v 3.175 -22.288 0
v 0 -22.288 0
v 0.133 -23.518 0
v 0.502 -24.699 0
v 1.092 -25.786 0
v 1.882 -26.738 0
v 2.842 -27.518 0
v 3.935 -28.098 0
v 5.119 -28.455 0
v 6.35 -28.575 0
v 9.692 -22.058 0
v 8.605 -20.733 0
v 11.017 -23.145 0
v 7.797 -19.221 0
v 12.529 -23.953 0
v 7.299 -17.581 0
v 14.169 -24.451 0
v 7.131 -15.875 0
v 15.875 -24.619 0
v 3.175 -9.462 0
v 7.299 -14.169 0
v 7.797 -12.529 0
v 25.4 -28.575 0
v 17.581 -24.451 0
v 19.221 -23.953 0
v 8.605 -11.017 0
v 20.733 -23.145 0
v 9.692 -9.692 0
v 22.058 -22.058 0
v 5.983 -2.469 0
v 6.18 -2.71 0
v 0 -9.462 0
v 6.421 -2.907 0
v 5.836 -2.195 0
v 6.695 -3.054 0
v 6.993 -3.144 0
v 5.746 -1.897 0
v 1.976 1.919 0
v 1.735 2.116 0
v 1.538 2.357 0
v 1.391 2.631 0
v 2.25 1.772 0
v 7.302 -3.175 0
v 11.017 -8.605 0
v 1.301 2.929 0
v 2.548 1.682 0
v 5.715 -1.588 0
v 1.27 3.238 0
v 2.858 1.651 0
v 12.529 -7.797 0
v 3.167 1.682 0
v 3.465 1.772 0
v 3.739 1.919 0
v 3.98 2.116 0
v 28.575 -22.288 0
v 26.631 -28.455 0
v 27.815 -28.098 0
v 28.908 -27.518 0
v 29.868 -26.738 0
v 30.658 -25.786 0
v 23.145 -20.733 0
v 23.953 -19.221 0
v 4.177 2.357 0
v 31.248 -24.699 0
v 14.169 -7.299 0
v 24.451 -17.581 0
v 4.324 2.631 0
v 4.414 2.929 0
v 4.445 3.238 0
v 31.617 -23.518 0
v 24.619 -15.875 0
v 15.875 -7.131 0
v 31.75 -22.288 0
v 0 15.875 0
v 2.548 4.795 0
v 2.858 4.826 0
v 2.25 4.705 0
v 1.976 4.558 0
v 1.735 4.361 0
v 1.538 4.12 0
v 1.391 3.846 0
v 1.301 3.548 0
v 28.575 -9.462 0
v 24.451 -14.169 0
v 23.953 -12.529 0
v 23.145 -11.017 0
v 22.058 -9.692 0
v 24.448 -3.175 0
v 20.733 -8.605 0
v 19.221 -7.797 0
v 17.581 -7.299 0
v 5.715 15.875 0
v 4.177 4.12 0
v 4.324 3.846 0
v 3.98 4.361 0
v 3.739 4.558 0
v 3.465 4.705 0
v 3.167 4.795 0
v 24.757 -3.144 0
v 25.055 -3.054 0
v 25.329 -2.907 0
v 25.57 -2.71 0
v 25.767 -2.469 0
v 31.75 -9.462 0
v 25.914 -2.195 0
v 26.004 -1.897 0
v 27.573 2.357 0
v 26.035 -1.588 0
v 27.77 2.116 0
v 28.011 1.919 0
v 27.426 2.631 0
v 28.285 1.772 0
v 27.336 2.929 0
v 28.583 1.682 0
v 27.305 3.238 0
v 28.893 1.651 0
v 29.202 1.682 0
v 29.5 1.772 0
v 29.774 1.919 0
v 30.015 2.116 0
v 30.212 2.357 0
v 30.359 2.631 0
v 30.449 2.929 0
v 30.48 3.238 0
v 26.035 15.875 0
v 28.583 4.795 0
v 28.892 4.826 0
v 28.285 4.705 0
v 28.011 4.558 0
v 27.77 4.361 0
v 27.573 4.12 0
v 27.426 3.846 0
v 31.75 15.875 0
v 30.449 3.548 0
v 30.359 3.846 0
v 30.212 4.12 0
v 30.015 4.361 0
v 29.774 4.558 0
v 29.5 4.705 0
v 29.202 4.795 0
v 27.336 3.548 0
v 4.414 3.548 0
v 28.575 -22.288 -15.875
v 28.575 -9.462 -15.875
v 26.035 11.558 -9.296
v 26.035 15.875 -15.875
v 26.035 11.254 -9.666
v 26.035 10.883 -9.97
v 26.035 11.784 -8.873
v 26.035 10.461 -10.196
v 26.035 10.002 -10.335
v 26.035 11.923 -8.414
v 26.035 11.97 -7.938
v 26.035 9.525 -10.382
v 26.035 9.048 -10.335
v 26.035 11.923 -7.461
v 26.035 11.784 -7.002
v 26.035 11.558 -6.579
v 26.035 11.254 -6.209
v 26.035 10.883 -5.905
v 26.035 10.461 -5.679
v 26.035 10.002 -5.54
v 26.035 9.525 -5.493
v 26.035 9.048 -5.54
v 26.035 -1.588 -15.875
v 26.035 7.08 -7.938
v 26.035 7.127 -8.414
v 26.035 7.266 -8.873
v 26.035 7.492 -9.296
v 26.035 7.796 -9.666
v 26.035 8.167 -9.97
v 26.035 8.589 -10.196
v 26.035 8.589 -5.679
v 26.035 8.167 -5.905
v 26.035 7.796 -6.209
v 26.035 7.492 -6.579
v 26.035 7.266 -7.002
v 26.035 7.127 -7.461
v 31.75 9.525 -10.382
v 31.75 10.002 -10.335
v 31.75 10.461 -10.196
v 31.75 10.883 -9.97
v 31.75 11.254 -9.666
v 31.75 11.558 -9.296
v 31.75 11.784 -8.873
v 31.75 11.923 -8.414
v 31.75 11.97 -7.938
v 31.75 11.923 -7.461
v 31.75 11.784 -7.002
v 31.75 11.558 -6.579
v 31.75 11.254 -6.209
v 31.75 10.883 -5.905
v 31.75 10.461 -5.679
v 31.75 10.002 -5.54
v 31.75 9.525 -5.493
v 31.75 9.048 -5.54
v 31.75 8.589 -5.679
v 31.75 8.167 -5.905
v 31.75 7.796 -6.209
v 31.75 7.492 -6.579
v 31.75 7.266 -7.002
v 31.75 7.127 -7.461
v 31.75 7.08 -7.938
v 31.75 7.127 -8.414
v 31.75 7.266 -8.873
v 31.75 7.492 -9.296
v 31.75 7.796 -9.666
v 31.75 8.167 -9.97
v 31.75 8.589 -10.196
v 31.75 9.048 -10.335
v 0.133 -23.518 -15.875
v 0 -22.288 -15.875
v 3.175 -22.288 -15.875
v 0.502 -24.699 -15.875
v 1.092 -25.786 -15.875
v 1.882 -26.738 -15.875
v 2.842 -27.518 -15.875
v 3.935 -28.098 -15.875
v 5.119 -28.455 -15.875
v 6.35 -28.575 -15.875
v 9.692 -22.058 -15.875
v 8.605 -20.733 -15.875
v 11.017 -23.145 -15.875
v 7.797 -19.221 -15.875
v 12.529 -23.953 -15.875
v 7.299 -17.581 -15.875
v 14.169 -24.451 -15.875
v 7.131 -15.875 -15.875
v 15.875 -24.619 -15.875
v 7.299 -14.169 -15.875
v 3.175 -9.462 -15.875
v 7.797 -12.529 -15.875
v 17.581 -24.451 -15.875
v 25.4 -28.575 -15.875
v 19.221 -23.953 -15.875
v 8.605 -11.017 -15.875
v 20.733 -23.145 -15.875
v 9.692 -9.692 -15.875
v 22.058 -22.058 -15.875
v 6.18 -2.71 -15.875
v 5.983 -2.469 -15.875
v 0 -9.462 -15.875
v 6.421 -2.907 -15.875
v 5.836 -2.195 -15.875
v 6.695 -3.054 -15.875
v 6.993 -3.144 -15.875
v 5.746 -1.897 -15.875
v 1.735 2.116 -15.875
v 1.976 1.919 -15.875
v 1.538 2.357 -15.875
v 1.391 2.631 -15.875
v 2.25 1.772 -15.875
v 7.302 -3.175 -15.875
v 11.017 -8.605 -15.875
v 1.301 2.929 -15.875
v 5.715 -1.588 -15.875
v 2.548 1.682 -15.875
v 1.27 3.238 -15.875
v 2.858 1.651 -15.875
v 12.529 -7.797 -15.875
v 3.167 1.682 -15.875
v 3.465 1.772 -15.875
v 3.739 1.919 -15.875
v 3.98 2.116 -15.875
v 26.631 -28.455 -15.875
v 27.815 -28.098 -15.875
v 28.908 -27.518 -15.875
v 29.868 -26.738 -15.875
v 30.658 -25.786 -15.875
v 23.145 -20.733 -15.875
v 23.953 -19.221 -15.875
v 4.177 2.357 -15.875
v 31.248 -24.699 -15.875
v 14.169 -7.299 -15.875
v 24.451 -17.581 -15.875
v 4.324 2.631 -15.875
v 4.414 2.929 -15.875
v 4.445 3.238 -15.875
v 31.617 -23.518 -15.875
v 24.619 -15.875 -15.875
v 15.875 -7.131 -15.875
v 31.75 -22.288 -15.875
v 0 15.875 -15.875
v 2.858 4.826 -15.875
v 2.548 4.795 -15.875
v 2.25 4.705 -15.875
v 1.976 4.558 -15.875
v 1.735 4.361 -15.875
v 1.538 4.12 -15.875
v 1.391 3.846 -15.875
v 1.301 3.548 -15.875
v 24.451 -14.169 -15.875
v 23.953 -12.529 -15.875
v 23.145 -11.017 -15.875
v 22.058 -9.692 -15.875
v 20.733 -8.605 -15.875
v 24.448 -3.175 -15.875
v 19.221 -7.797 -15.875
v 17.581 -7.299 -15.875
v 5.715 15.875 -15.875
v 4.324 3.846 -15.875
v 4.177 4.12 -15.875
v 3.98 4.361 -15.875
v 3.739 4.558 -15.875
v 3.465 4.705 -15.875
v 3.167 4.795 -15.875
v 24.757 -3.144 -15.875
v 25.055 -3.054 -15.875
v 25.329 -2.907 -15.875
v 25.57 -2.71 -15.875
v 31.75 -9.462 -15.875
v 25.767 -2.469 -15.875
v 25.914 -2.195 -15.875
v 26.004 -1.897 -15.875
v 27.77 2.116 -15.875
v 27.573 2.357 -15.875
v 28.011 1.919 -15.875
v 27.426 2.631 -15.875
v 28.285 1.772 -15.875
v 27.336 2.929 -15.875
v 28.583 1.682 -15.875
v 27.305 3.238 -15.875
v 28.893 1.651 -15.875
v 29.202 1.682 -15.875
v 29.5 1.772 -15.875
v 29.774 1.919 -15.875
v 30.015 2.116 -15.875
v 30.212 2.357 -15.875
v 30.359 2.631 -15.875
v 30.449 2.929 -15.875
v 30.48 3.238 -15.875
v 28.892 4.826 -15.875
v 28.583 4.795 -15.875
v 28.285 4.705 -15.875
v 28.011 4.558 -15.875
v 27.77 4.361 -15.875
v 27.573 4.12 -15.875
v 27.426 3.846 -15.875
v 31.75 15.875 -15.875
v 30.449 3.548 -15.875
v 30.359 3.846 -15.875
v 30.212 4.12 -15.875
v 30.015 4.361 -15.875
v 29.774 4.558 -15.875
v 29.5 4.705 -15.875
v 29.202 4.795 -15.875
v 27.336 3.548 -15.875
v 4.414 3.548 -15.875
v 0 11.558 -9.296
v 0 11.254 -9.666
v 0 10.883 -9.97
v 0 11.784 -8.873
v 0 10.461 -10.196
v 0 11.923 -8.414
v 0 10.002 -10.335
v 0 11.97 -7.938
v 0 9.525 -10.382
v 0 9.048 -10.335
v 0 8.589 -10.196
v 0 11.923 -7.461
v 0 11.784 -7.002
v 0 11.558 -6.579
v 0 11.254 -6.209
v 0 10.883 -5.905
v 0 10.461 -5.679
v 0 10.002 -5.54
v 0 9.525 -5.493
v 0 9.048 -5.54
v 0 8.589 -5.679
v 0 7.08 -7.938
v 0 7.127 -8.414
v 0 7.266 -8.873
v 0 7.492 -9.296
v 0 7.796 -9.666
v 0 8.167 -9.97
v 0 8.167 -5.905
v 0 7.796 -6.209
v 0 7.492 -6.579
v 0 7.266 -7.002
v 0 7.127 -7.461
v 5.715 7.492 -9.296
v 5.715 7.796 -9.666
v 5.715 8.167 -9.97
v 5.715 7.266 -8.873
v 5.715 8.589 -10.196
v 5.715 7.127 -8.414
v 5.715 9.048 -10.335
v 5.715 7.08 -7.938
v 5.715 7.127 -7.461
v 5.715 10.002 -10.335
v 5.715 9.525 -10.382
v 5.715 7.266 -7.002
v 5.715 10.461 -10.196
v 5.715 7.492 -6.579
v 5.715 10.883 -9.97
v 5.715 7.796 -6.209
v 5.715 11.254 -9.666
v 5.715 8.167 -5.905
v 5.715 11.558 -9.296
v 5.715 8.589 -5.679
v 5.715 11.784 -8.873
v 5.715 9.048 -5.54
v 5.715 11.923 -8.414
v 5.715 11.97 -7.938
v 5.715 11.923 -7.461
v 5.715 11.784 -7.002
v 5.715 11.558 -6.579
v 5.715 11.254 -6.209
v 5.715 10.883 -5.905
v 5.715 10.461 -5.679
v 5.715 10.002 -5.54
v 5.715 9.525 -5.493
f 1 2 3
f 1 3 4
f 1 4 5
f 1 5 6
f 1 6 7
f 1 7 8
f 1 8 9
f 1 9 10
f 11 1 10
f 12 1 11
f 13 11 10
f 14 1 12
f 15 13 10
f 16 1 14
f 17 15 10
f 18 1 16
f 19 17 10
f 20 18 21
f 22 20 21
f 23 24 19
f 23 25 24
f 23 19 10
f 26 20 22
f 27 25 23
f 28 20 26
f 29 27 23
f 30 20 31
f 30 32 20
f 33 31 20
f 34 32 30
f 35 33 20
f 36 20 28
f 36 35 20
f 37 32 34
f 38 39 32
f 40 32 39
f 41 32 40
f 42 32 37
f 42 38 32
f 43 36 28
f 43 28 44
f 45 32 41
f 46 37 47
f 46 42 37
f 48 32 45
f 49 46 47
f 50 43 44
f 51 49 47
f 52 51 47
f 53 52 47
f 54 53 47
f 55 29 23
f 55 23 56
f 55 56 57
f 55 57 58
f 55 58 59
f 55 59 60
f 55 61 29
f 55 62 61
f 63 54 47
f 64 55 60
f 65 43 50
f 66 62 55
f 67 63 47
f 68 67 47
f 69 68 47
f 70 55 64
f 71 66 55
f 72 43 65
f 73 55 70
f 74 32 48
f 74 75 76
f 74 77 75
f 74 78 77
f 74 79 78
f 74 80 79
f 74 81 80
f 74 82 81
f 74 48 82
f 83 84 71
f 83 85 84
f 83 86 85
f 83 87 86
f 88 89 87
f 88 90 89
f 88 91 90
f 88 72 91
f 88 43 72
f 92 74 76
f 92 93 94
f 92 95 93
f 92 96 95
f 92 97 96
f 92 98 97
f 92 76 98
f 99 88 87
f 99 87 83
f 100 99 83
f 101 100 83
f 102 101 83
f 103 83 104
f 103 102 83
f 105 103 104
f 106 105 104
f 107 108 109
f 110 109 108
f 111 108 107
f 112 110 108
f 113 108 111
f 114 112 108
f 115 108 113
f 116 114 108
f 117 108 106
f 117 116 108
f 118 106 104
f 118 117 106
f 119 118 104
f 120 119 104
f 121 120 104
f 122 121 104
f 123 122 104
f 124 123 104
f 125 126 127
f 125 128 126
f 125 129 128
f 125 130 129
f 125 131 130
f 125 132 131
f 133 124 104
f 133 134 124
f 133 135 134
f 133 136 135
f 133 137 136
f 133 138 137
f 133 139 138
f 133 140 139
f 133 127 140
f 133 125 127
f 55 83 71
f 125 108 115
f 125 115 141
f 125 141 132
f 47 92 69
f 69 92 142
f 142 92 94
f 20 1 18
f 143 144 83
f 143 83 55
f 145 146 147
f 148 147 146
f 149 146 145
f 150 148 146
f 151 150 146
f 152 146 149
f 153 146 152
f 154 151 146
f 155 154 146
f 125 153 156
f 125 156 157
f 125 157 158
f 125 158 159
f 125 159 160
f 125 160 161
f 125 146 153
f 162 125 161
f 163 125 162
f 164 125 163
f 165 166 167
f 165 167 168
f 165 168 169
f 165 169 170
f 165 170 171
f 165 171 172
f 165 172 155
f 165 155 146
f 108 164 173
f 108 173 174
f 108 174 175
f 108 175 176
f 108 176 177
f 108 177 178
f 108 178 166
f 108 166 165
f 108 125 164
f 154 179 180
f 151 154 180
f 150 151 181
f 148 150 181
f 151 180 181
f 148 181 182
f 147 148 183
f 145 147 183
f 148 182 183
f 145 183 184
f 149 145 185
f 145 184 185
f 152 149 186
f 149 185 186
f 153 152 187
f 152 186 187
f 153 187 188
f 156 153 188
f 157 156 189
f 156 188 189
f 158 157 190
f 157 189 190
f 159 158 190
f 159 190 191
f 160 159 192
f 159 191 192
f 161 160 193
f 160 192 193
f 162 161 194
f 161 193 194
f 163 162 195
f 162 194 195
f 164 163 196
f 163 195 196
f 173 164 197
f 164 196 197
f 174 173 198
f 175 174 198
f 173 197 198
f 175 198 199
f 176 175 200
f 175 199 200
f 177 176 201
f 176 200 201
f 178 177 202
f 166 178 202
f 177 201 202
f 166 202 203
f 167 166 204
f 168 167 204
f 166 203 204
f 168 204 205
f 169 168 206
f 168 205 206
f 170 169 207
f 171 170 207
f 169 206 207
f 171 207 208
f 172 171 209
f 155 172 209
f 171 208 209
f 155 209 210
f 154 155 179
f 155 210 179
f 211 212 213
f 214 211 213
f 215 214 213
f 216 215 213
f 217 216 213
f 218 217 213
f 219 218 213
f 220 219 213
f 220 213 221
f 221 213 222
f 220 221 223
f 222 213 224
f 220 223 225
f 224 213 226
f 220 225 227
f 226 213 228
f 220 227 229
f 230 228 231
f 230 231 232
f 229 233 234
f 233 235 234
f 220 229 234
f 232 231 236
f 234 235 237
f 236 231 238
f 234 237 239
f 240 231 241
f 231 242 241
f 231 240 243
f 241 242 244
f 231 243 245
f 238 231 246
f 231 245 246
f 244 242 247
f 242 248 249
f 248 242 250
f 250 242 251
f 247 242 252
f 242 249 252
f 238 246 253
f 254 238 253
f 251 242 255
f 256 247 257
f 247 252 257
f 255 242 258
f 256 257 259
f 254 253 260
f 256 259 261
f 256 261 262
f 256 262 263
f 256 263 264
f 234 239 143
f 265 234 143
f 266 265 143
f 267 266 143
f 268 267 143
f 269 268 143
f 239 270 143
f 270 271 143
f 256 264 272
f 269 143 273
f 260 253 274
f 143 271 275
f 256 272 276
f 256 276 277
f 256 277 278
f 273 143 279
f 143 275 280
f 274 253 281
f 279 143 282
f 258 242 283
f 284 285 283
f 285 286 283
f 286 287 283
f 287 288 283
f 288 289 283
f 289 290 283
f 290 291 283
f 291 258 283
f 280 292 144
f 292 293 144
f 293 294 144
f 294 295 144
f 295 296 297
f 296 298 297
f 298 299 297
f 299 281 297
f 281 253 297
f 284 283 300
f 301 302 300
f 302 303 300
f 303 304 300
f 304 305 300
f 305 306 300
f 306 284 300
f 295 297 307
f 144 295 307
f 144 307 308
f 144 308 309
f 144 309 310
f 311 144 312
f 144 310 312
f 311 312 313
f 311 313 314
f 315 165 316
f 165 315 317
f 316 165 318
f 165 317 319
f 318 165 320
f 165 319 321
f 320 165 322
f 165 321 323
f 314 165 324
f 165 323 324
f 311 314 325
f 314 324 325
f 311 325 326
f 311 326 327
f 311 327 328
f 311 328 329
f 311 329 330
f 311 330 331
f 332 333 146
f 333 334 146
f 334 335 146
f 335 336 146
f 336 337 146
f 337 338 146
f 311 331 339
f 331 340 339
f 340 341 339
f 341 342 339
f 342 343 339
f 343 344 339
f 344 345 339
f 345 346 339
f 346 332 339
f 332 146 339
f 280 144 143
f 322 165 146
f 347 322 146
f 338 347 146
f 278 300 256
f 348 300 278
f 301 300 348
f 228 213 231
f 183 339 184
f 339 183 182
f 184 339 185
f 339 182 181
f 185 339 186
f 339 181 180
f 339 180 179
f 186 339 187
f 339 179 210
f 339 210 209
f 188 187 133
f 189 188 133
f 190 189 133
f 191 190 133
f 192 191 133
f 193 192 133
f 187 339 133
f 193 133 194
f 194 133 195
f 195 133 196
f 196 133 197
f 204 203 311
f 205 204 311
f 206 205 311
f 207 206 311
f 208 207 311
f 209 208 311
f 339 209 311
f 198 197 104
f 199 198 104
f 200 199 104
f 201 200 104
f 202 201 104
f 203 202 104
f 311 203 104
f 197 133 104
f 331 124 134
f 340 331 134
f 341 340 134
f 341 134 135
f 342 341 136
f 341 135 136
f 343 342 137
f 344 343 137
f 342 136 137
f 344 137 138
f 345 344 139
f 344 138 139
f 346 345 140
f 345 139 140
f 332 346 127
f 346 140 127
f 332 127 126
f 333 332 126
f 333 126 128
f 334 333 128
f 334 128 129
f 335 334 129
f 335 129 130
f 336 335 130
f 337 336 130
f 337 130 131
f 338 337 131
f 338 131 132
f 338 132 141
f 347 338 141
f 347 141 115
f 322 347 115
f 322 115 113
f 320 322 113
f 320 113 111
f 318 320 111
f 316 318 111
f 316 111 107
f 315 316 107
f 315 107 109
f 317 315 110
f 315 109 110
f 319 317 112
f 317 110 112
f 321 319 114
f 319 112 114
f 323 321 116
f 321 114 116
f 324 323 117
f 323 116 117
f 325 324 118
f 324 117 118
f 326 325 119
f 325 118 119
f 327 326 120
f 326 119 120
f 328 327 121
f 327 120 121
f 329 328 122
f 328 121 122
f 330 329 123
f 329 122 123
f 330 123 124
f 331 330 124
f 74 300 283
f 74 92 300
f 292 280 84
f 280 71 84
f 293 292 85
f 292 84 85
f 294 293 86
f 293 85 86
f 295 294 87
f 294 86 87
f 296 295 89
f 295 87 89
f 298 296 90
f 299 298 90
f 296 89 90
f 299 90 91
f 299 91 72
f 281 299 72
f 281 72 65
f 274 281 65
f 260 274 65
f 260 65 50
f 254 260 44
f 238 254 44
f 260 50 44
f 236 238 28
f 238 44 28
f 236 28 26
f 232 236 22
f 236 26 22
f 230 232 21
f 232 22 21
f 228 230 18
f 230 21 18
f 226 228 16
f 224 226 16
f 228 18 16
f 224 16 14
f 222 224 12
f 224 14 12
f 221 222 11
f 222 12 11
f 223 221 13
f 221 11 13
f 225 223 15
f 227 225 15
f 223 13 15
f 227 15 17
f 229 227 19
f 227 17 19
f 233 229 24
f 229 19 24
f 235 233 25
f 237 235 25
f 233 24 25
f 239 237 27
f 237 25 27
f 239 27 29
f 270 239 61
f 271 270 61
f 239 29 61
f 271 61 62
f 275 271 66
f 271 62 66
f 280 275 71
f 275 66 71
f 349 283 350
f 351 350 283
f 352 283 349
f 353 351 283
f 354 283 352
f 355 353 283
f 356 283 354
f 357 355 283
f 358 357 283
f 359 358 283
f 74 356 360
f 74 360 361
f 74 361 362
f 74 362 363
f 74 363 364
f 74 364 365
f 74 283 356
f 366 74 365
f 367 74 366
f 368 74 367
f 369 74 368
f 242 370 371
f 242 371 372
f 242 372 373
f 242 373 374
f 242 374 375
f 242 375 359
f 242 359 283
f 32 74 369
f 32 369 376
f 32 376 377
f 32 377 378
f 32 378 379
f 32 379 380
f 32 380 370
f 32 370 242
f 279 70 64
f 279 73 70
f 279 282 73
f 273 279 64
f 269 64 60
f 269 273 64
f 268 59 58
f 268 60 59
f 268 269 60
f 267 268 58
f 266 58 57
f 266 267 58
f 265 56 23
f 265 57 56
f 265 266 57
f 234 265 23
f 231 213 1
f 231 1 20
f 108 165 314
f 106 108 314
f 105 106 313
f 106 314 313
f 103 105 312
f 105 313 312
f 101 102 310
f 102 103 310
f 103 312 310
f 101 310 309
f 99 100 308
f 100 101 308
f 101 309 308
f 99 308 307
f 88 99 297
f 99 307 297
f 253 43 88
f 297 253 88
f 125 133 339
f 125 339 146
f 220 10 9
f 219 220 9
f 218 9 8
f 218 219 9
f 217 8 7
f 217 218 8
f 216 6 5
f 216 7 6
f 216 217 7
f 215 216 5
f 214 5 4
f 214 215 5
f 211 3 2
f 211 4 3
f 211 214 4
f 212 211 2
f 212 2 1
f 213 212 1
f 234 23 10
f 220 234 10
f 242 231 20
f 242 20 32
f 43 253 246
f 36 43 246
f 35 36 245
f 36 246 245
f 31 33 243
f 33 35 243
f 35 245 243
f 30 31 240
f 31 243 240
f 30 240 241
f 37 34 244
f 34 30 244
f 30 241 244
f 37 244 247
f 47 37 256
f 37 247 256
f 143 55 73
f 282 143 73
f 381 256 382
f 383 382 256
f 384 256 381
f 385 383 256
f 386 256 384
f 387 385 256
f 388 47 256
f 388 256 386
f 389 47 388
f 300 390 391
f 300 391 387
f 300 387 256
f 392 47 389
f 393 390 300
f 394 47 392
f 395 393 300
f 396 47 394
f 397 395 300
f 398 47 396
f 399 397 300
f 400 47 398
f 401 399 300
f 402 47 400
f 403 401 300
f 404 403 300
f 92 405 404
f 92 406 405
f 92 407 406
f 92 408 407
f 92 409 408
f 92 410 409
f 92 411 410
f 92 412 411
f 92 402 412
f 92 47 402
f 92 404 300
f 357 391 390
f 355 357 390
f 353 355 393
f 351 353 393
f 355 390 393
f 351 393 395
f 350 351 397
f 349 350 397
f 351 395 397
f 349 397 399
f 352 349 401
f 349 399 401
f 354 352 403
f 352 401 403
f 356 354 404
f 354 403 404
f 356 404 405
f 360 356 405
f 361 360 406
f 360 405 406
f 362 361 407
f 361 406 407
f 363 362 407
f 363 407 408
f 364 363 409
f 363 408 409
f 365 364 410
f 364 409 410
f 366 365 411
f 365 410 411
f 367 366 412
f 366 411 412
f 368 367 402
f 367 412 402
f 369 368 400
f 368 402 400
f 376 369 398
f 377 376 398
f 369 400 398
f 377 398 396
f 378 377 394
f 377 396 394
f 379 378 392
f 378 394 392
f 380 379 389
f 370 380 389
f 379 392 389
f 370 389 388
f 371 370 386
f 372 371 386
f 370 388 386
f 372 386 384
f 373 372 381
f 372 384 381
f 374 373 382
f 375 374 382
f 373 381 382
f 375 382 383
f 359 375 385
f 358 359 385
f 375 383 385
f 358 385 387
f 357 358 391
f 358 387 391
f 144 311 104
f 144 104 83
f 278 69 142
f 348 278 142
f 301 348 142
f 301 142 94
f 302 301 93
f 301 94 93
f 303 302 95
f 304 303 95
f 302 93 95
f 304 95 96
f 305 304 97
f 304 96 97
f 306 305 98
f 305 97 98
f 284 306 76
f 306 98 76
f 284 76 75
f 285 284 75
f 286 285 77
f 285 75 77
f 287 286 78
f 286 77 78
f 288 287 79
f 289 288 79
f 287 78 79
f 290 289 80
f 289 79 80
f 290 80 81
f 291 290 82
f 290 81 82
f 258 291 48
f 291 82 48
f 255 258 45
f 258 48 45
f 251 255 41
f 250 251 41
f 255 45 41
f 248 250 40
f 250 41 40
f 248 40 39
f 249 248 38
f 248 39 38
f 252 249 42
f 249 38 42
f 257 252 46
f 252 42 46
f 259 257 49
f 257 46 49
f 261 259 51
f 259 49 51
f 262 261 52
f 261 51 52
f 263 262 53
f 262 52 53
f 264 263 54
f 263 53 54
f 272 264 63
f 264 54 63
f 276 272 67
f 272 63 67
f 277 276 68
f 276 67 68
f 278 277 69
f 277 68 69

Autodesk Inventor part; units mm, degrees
ref_plane "YZ Plane" through (0, 0, 0) normal (1, 0, 0) x (0, 1, 0)
ref_plane "XZ Plane" through (0, 0, 0) normal (0, 1, 0) x (-1, 0, 0)
ref_plane "XY Plane" through (0, 0, 0) normal (0, 0, 1) x (1, 0, 0)
sketch "Sketch1" plane through (0, 0, 0) normal (0, 0, 1) x (1, 0, 0)
  line L0 (0, -3.175) -> (31.75, -3.175)
  line L1 (31.75, -3.175) -> (31.75, -28.575)
  line L2 (31.75, -28.575) -> (0, -28.575)
  line L3 (0, -28.575) -> (0, -3.175)
  line L4 (0, -3.175) -> (5.715, -3.175)
  line L5 (5.715, -3.175) -> (5.715, 15.875)
  line L6 (5.715, 15.875) -> (0, 15.875)
  line L7 (0, 15.875) -> (0, -3.175)
  line L8 (26.035, -3.175) -> (31.75, -3.175)
  line L9 (31.75, -3.175) -> (31.75, 15.875)
  line L10 (31.75, 15.875) -> (26.035, 15.875)
  line L11 (26.035, 15.875) -> (26.035, -3.175)
  point P0 (0, 0)
  dimension "d0" = 25.4
  dimension "d1" = 5.715
  dimension "d2" = 5.715
  dimension "d3" = 19.05
  dimension "d4" = 31.75
  dimension "d24" = 20.32
extrude "Extrusion1" add sketch "Sketch1" against normal blind 15.875
sketch "Sketch2" plane through (0, 0, 0) normal (0, 0, 1) x (1, 0, 0)
  line L0 (31.75, -28.575) -> (0, -28.575) projected
  circle A0 centre (15.875, -15.875) radius 8.7439
  dimension "d10" = 17.4879
  dimension "d13" = 12.7
extrude "Extrusion2" cut sketch "Sketch2" against normal blind 15.875
sketch "Sketch3" plane through (31.75, -3.175, 0) normal (1, 0, 0) x (0, 0, -1)
  line L0 (0, 19.05) -> (15.875, 19.05) projected
  line L1 (-0.1272, 19.05) -> (15.7478, 19.05)
  circle A0 centre (7.9375, 12.7) radius 2.4447
  dimension "d16" = 4.8895
  dimension "d17" = 6.35
  dimension "d18" = 0
extrude "Extrusion3" cut sketch "Sketch3" against normal through all
fillet "Fillet1" radius 1.5875 2 edges at (5.715, -3.175, -7.9375) (26.035, -3.175, -7.9375)
fillet "Fillet3" radius 6.35 2 edges at (0, -28.575, -7.9375) (31.75, -28.575, -7.9375)
sketch "Sketch5" plane through (0, 0, 0) normal (0, 0, 1) x (1, 0, 0)
  line L0 (31.75, 15.875) -> (31.75, -22.225) projected
  line L1 (0, -22.225) -> (0, 15.875) projected
  line L2 (0, -22.2885) -> (3.175, -22.2885)
  line L3 (3.175, -22.2885) -> (3.175, -9.4615)
  line L4 (3.175, -9.4615) -> (0, -9.4615)
  line L5 (0, -9.4615) -> (0, -22.2885)
  line L6 (31.75, -9.4615) -> (28.575, -9.4615)
  line L7 (28.575, -9.4615) -> (28.575, -22.2885)
  line L8 (28.575, -22.2885) -> (31.75, -22.2885)
  line L9 (31.75, -22.2885) -> (31.75, -9.4615)
  circle A0 centre (15.875, -15.875) radius 8.7439 projected
  point P0 (0, 0)
  point P1 (3.175, -15.875)
  dimension "d33" = 12.827
  dimension "d34" = 3.175
  dimension "d35" = 3.175
  dimension "d41" = 0
extrude "Extrusion5" cut sketch "Sketch5" against normal blind 25.4 contours L0 L9 L8 L7 L6 | L1 L4 L3 L2 L5
sketch "Sketch6" plane through (0, 0, 0) normal (0, 0, 1) x (1, 0, 0)
  line L0 (0, -9.4615) -> (0, 15.875) projected
  line L1 (0, -9.4615) -> (3.175, -9.4615) projected
  circle A0 centre (2.8575, 3.2385) radius 1.5875
  circle A1 centre (28.8925, 3.2385) radius 1.5875
  line L2 (28.575, -9.4615) -> (31.75, -9.4615) projected
  line L3 (26.035, -1.5875) -> (26.035, 15.875) projected
  point P0 (0, 0)
  dimension "d42" = 3.175
  dimension "d43" = 2.8575
  dimension "d44" = 12.7
  dimension "d45" = 3.175
  dimension "d50" = 12.7
  dimension "d51" = 2.8575
extrude "Extrusion6" cut sketch "Sketch6" against normal blind 25.4
properties part number "Smaller Needle Bearing Mount" material "Polyethylene, High Density"
